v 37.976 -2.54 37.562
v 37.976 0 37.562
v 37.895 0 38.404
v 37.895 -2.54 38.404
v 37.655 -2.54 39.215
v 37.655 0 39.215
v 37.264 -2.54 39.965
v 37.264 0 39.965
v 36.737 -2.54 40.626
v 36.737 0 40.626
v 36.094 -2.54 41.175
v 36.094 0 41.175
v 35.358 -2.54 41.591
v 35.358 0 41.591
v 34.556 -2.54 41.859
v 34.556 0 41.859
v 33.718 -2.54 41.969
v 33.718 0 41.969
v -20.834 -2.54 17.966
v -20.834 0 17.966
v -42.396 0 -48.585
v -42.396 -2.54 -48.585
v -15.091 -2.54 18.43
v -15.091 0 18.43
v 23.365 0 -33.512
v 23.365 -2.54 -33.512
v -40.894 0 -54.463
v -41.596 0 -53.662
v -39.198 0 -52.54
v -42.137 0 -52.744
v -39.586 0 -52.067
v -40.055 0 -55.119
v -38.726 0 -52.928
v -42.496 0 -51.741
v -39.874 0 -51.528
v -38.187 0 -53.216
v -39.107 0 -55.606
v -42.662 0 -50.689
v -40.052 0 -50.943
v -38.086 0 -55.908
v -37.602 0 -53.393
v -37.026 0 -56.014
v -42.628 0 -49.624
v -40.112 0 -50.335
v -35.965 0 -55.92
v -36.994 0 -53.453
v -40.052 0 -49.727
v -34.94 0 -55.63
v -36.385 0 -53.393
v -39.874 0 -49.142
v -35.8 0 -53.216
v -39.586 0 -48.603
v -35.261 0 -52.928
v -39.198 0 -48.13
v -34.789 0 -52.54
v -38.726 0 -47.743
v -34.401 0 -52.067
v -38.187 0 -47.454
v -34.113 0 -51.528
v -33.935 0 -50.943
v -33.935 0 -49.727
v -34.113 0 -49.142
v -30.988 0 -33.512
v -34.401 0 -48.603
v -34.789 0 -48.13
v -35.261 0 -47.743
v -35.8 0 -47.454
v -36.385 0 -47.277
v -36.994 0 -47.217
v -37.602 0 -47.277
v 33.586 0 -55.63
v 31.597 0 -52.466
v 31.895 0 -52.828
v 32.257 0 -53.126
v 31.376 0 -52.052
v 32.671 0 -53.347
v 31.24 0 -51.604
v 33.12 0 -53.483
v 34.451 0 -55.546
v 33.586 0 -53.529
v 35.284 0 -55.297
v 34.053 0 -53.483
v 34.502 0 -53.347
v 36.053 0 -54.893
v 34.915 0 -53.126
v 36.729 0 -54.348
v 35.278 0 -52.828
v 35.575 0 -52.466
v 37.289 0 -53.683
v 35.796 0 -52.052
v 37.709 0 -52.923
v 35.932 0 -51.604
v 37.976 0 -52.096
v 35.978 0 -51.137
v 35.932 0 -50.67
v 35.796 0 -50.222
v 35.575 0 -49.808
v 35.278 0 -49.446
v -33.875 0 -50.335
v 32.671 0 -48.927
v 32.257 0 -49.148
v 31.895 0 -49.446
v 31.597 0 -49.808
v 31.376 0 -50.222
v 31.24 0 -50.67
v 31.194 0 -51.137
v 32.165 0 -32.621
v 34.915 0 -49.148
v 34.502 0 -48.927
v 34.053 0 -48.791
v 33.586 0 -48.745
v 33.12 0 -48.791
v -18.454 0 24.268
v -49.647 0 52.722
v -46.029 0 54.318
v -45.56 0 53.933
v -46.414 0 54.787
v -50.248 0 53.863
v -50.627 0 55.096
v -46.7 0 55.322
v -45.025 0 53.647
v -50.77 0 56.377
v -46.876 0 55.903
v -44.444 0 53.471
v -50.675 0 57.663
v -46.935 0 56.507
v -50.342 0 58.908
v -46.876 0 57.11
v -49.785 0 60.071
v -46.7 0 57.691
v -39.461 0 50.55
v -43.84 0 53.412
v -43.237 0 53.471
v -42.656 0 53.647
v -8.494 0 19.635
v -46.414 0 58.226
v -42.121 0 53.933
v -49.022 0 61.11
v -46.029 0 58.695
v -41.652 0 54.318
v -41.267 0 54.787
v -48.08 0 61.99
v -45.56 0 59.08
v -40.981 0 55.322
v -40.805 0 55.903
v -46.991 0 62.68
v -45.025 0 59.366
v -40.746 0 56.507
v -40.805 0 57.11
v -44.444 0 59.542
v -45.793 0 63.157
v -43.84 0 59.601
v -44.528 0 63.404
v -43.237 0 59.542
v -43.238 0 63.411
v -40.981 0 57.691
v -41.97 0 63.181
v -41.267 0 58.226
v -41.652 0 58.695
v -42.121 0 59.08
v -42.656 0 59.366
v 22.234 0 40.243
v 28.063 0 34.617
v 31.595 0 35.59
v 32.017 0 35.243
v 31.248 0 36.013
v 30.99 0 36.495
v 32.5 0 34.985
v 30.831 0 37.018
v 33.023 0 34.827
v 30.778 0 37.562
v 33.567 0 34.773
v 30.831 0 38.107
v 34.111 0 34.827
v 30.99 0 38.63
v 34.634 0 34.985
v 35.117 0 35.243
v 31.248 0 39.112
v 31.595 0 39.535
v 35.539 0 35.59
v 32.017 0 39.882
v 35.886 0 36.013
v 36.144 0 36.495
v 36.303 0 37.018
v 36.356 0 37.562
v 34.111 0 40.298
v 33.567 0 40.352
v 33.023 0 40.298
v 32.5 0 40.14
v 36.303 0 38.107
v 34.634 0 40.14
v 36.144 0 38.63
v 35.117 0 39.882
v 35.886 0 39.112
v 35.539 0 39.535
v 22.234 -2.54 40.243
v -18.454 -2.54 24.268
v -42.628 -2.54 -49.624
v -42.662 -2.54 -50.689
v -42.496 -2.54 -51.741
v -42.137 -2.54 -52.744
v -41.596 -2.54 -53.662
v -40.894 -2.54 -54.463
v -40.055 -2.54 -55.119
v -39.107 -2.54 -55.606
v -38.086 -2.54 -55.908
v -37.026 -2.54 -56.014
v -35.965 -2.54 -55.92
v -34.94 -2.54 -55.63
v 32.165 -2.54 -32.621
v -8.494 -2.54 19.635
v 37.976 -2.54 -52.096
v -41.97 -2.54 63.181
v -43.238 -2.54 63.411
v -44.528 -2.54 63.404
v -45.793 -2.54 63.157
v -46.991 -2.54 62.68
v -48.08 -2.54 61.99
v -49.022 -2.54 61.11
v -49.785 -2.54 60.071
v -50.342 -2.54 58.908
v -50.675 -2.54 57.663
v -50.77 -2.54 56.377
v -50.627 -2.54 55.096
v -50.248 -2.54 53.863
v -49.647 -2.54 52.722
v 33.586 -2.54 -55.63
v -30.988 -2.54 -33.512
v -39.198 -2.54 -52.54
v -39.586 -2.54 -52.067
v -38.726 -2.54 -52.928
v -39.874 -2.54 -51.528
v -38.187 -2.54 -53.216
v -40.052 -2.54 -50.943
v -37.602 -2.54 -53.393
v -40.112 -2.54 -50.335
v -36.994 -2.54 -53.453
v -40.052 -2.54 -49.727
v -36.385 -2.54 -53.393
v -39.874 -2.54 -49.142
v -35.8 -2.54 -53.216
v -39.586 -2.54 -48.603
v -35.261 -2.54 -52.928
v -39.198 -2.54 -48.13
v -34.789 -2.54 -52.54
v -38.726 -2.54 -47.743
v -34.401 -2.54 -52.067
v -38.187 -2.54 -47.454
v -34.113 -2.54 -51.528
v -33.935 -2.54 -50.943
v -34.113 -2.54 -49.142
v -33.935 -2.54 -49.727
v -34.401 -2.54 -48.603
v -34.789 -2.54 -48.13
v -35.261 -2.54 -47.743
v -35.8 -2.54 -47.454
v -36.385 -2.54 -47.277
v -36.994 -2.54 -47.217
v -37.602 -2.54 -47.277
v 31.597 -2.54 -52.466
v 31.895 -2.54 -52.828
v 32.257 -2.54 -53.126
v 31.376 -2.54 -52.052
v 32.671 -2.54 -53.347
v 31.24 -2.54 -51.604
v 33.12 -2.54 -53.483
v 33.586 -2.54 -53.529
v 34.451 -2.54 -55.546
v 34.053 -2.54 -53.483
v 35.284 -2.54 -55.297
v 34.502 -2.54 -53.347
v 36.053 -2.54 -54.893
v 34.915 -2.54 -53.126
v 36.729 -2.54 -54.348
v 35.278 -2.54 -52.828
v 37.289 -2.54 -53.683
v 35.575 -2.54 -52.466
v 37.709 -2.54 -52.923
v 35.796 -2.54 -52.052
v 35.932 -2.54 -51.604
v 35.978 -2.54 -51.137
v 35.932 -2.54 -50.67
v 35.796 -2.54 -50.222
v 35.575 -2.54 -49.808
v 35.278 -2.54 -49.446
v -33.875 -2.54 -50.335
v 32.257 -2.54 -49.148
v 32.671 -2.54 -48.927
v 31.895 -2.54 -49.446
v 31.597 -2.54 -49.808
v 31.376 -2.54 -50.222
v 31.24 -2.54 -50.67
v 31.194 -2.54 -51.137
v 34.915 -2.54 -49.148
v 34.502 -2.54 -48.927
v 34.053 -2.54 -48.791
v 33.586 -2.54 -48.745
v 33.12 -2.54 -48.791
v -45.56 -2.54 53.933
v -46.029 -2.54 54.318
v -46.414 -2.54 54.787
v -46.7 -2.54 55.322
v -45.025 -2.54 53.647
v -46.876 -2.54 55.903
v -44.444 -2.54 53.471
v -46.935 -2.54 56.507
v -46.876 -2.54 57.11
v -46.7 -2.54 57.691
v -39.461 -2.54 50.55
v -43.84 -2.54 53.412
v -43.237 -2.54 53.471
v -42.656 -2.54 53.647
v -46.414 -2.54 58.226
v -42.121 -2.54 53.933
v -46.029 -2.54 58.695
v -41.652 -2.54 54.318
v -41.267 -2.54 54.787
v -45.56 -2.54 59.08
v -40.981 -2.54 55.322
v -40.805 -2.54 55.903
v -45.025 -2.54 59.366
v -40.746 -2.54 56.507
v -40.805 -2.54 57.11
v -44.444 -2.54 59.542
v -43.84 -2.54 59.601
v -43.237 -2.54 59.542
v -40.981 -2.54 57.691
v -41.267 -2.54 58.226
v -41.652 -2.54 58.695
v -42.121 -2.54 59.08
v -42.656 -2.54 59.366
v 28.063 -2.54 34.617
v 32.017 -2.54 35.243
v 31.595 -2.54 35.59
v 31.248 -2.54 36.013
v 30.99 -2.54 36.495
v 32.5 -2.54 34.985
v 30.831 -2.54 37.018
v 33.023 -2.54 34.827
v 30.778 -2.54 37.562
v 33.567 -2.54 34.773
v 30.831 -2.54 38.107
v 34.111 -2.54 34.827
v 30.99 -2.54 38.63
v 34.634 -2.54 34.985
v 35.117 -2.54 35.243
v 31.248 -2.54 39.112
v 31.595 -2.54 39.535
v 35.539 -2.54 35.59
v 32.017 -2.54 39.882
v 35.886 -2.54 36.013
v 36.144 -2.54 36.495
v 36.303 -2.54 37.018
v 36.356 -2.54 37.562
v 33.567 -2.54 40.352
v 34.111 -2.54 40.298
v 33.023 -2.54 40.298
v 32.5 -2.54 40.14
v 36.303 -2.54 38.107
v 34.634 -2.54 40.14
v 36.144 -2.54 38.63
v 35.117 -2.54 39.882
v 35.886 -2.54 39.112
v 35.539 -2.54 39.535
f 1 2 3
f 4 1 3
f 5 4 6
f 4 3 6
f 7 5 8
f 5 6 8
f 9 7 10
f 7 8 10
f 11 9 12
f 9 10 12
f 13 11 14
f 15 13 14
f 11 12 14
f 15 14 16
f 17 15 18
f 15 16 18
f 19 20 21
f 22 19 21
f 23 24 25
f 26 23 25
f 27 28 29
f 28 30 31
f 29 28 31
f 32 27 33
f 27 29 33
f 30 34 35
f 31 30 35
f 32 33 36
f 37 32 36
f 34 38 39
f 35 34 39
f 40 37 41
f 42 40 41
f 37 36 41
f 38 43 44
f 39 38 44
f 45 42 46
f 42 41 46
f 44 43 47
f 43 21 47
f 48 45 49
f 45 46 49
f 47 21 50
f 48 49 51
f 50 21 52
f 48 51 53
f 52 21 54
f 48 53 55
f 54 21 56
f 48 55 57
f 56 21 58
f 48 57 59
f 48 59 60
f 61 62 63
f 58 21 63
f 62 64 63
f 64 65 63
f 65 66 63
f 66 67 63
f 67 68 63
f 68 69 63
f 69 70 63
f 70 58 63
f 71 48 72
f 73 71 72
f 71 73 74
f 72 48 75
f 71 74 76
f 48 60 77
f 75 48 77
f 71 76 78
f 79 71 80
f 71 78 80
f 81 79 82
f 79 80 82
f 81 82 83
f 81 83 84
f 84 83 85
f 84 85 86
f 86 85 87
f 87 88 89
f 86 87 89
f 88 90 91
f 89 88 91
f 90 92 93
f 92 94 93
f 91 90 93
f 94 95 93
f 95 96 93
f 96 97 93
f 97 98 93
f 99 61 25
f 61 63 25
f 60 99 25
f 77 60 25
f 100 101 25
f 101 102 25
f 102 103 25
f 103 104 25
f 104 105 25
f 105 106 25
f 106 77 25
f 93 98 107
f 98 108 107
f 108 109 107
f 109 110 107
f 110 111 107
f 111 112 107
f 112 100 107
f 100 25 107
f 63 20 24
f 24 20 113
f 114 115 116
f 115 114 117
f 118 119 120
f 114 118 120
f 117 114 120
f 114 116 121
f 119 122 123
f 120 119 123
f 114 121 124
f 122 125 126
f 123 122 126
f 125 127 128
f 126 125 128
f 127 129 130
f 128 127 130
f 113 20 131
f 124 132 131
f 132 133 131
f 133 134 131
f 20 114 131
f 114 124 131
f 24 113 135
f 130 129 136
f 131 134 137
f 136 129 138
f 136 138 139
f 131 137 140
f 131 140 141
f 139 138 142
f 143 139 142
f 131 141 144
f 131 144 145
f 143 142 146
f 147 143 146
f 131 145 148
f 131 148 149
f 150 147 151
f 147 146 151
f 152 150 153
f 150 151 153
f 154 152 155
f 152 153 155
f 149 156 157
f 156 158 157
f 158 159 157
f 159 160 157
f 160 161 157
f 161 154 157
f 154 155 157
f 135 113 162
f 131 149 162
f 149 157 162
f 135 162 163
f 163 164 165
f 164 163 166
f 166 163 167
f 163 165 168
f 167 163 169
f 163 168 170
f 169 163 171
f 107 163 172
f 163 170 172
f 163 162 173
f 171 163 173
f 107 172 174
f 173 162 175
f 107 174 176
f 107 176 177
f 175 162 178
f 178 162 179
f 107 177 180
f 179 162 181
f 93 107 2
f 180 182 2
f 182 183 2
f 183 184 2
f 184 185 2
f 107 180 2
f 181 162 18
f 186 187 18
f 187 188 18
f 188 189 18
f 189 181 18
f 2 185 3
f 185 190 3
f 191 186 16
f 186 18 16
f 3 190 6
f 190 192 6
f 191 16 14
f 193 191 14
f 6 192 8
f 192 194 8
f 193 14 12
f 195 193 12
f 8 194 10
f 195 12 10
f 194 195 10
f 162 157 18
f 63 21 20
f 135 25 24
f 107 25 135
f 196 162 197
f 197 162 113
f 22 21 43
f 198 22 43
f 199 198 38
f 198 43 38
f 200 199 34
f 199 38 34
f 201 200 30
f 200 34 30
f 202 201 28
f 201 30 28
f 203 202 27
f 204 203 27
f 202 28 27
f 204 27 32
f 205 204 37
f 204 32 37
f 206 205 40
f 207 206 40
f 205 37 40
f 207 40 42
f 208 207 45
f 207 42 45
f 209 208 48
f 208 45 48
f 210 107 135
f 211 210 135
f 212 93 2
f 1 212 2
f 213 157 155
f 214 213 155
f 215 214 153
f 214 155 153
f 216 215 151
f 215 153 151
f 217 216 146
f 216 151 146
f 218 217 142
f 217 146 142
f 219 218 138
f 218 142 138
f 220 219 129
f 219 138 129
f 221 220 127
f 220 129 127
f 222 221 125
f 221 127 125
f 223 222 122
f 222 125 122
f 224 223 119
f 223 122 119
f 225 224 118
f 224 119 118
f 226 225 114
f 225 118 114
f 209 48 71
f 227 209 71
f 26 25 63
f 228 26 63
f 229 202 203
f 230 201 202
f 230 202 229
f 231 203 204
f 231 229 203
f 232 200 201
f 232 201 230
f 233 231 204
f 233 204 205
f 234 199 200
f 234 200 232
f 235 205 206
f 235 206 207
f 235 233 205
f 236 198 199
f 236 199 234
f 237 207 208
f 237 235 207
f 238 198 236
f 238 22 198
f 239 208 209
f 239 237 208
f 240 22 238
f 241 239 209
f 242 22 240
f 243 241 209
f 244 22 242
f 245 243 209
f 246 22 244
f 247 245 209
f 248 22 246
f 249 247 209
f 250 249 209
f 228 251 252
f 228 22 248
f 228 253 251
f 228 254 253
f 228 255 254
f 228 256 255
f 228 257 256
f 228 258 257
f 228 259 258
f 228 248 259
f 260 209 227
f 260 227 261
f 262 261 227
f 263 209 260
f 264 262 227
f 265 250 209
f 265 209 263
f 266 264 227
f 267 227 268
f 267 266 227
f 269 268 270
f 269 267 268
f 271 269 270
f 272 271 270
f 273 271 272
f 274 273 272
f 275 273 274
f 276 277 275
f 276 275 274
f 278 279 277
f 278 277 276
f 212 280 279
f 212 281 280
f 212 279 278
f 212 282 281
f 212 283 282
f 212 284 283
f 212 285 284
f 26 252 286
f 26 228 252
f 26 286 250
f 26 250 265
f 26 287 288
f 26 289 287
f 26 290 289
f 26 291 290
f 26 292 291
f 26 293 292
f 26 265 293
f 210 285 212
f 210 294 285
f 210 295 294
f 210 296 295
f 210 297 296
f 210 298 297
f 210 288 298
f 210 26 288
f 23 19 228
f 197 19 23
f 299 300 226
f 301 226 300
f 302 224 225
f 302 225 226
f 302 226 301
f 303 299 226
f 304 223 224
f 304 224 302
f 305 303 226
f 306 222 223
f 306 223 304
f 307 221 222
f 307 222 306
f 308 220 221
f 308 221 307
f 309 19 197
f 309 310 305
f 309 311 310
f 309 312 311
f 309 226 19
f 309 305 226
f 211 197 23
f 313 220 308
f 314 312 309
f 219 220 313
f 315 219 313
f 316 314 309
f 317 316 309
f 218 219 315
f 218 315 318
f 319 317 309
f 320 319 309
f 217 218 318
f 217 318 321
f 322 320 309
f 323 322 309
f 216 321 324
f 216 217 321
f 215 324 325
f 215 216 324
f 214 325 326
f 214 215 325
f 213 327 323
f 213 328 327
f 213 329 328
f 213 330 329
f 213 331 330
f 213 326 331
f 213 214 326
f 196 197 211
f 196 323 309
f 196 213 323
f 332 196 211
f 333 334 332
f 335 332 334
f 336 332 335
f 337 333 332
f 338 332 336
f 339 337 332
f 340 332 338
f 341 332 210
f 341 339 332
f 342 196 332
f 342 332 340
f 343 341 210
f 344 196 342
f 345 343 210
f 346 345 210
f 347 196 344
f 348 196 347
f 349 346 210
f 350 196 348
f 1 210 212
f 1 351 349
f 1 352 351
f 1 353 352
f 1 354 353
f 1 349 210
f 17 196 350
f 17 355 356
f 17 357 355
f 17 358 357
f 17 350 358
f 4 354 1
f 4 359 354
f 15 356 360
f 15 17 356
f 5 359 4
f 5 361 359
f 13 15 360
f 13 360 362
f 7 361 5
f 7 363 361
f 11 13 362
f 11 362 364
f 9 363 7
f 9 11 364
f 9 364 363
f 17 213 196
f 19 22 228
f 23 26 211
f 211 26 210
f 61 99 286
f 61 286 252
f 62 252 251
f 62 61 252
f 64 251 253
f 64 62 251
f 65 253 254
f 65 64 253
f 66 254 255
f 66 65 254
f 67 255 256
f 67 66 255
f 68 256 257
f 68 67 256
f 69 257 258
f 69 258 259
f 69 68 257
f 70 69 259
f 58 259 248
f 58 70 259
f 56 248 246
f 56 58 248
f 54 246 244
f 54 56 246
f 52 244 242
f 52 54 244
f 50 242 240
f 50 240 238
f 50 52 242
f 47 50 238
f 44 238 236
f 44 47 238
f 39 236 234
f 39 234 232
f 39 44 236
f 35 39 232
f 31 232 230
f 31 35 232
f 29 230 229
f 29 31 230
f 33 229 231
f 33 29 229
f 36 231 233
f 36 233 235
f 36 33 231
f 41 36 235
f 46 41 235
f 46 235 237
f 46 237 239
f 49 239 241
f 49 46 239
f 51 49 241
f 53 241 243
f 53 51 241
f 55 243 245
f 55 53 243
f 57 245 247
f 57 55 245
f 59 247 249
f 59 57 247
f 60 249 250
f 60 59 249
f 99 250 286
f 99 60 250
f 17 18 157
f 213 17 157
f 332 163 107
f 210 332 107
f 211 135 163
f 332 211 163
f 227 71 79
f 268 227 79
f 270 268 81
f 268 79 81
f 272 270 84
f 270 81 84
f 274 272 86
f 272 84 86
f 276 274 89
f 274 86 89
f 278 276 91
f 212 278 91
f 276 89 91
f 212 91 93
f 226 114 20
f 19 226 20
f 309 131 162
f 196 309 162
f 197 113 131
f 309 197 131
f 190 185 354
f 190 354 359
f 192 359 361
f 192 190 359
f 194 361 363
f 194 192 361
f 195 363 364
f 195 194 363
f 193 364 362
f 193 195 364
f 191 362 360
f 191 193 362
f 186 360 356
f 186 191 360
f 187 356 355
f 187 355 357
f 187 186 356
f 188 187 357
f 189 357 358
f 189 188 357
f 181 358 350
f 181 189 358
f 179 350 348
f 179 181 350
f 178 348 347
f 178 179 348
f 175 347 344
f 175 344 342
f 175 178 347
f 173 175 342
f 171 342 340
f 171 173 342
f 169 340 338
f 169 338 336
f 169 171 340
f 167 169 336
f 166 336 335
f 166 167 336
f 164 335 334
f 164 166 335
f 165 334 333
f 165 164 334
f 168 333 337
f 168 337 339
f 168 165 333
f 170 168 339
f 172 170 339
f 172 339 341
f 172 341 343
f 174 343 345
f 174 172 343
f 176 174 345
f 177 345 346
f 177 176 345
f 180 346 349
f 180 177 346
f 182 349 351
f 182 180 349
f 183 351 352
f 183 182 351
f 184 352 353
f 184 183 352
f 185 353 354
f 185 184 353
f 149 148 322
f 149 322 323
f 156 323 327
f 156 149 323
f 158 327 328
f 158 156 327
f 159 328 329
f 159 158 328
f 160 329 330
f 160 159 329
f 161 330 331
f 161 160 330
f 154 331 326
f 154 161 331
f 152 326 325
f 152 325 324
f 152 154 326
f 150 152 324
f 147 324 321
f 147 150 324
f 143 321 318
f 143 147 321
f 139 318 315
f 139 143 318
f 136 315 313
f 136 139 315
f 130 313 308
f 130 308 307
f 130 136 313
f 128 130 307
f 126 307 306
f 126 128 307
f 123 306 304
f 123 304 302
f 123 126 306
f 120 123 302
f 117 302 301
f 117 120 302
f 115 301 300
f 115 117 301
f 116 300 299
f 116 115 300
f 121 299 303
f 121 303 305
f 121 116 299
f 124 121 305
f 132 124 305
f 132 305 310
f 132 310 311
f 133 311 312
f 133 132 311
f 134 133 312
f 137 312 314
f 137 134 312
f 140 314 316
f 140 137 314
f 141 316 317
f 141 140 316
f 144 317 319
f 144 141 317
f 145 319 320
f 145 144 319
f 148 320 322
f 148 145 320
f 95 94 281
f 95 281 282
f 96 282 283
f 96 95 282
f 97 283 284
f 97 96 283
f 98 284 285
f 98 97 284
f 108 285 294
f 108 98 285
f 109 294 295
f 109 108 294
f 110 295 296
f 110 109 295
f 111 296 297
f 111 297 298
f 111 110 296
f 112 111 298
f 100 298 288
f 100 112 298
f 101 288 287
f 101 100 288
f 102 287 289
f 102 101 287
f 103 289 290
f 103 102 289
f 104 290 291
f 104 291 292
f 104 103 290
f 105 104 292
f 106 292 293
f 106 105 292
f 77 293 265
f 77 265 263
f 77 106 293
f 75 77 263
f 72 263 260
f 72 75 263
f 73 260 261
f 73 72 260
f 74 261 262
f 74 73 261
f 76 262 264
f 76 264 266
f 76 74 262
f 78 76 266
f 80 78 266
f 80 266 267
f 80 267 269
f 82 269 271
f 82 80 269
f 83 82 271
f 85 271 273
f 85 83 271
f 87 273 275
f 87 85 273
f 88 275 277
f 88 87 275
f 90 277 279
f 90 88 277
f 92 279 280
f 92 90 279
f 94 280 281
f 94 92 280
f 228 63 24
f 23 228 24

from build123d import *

# Parameters (mm, degrees)
F0_R     = 3.118101
F0_R_2   = 2.391899
F0_R_3   = 3.09485
F0_R_4   = 2.789347
F1_DEPTH = 2.54


with BuildPart() as f1:
    # F0 (on Front) → F1 (new body)
    with BuildSketch(Plane.XZ):
        with BuildLine():
            ThreePointArc((-42.396322, -48.584666), (-40.893992, -54.463207), (-34.939781, -55.630088))
            Line((-34.939781, -55.630088), (33.586267, -55.630088))
            ThreePointArc((33.586267, -55.630088), (36.404137, -54.636666), (37.975974, -52.095681))
            Line((37.975974, -52.095681), (37.975974, 37.562497))
            ThreePointArc((37.975974, 37.562497), (36.737459, 40.626378), (33.717722, 41.968942))
            Line((33.717722, 41.968942), (-41.97007, 63.180551))
            ThreePointArc((-41.97007, 63.180551), (-49.42771, 60.608198), (-49.647491, 52.722447))
            Line((-49.647491, 52.722447), (-20.833982, 17.965764))
            Line((-20.833982, 17.965764), (-42.396322, -48.584666))
        make_face()
        with Locations((-36.99355, -50.335164)):
            Circle(F0_R, mode=Mode.SUBTRACT)
        with Locations((33.586267, -51.136893)):
            Circle(F0_R_2, mode=Mode.SUBTRACT)
        Polygon((23.365004, -33.512361), (-30.987732, -33.512361), (-15.091307, 18.429529), align=None, mode=Mode.SUBTRACT)
        Polygon((28.063117, 34.616884), (32.164525, -32.620855), (-8.49389, 19.635132), align=None, mode=Mode.SUBTRACT)
        with Locations((-43.840472, 56.506539)):
            Circle(F0_R_3, mode=Mode.SUBTRACT)
        Polygon((22.234073, 40.242676), (-18.454095, 24.267845), (-39.46146, 50.549764), align=None, mode=Mode.SUBTRACT)
        with Locations((33.566951, 37.562497)):
            Circle(F0_R_4, mode=Mode.SUBTRACT)
    extrude(amount=F1_DEPTH)


solid = f1.part
